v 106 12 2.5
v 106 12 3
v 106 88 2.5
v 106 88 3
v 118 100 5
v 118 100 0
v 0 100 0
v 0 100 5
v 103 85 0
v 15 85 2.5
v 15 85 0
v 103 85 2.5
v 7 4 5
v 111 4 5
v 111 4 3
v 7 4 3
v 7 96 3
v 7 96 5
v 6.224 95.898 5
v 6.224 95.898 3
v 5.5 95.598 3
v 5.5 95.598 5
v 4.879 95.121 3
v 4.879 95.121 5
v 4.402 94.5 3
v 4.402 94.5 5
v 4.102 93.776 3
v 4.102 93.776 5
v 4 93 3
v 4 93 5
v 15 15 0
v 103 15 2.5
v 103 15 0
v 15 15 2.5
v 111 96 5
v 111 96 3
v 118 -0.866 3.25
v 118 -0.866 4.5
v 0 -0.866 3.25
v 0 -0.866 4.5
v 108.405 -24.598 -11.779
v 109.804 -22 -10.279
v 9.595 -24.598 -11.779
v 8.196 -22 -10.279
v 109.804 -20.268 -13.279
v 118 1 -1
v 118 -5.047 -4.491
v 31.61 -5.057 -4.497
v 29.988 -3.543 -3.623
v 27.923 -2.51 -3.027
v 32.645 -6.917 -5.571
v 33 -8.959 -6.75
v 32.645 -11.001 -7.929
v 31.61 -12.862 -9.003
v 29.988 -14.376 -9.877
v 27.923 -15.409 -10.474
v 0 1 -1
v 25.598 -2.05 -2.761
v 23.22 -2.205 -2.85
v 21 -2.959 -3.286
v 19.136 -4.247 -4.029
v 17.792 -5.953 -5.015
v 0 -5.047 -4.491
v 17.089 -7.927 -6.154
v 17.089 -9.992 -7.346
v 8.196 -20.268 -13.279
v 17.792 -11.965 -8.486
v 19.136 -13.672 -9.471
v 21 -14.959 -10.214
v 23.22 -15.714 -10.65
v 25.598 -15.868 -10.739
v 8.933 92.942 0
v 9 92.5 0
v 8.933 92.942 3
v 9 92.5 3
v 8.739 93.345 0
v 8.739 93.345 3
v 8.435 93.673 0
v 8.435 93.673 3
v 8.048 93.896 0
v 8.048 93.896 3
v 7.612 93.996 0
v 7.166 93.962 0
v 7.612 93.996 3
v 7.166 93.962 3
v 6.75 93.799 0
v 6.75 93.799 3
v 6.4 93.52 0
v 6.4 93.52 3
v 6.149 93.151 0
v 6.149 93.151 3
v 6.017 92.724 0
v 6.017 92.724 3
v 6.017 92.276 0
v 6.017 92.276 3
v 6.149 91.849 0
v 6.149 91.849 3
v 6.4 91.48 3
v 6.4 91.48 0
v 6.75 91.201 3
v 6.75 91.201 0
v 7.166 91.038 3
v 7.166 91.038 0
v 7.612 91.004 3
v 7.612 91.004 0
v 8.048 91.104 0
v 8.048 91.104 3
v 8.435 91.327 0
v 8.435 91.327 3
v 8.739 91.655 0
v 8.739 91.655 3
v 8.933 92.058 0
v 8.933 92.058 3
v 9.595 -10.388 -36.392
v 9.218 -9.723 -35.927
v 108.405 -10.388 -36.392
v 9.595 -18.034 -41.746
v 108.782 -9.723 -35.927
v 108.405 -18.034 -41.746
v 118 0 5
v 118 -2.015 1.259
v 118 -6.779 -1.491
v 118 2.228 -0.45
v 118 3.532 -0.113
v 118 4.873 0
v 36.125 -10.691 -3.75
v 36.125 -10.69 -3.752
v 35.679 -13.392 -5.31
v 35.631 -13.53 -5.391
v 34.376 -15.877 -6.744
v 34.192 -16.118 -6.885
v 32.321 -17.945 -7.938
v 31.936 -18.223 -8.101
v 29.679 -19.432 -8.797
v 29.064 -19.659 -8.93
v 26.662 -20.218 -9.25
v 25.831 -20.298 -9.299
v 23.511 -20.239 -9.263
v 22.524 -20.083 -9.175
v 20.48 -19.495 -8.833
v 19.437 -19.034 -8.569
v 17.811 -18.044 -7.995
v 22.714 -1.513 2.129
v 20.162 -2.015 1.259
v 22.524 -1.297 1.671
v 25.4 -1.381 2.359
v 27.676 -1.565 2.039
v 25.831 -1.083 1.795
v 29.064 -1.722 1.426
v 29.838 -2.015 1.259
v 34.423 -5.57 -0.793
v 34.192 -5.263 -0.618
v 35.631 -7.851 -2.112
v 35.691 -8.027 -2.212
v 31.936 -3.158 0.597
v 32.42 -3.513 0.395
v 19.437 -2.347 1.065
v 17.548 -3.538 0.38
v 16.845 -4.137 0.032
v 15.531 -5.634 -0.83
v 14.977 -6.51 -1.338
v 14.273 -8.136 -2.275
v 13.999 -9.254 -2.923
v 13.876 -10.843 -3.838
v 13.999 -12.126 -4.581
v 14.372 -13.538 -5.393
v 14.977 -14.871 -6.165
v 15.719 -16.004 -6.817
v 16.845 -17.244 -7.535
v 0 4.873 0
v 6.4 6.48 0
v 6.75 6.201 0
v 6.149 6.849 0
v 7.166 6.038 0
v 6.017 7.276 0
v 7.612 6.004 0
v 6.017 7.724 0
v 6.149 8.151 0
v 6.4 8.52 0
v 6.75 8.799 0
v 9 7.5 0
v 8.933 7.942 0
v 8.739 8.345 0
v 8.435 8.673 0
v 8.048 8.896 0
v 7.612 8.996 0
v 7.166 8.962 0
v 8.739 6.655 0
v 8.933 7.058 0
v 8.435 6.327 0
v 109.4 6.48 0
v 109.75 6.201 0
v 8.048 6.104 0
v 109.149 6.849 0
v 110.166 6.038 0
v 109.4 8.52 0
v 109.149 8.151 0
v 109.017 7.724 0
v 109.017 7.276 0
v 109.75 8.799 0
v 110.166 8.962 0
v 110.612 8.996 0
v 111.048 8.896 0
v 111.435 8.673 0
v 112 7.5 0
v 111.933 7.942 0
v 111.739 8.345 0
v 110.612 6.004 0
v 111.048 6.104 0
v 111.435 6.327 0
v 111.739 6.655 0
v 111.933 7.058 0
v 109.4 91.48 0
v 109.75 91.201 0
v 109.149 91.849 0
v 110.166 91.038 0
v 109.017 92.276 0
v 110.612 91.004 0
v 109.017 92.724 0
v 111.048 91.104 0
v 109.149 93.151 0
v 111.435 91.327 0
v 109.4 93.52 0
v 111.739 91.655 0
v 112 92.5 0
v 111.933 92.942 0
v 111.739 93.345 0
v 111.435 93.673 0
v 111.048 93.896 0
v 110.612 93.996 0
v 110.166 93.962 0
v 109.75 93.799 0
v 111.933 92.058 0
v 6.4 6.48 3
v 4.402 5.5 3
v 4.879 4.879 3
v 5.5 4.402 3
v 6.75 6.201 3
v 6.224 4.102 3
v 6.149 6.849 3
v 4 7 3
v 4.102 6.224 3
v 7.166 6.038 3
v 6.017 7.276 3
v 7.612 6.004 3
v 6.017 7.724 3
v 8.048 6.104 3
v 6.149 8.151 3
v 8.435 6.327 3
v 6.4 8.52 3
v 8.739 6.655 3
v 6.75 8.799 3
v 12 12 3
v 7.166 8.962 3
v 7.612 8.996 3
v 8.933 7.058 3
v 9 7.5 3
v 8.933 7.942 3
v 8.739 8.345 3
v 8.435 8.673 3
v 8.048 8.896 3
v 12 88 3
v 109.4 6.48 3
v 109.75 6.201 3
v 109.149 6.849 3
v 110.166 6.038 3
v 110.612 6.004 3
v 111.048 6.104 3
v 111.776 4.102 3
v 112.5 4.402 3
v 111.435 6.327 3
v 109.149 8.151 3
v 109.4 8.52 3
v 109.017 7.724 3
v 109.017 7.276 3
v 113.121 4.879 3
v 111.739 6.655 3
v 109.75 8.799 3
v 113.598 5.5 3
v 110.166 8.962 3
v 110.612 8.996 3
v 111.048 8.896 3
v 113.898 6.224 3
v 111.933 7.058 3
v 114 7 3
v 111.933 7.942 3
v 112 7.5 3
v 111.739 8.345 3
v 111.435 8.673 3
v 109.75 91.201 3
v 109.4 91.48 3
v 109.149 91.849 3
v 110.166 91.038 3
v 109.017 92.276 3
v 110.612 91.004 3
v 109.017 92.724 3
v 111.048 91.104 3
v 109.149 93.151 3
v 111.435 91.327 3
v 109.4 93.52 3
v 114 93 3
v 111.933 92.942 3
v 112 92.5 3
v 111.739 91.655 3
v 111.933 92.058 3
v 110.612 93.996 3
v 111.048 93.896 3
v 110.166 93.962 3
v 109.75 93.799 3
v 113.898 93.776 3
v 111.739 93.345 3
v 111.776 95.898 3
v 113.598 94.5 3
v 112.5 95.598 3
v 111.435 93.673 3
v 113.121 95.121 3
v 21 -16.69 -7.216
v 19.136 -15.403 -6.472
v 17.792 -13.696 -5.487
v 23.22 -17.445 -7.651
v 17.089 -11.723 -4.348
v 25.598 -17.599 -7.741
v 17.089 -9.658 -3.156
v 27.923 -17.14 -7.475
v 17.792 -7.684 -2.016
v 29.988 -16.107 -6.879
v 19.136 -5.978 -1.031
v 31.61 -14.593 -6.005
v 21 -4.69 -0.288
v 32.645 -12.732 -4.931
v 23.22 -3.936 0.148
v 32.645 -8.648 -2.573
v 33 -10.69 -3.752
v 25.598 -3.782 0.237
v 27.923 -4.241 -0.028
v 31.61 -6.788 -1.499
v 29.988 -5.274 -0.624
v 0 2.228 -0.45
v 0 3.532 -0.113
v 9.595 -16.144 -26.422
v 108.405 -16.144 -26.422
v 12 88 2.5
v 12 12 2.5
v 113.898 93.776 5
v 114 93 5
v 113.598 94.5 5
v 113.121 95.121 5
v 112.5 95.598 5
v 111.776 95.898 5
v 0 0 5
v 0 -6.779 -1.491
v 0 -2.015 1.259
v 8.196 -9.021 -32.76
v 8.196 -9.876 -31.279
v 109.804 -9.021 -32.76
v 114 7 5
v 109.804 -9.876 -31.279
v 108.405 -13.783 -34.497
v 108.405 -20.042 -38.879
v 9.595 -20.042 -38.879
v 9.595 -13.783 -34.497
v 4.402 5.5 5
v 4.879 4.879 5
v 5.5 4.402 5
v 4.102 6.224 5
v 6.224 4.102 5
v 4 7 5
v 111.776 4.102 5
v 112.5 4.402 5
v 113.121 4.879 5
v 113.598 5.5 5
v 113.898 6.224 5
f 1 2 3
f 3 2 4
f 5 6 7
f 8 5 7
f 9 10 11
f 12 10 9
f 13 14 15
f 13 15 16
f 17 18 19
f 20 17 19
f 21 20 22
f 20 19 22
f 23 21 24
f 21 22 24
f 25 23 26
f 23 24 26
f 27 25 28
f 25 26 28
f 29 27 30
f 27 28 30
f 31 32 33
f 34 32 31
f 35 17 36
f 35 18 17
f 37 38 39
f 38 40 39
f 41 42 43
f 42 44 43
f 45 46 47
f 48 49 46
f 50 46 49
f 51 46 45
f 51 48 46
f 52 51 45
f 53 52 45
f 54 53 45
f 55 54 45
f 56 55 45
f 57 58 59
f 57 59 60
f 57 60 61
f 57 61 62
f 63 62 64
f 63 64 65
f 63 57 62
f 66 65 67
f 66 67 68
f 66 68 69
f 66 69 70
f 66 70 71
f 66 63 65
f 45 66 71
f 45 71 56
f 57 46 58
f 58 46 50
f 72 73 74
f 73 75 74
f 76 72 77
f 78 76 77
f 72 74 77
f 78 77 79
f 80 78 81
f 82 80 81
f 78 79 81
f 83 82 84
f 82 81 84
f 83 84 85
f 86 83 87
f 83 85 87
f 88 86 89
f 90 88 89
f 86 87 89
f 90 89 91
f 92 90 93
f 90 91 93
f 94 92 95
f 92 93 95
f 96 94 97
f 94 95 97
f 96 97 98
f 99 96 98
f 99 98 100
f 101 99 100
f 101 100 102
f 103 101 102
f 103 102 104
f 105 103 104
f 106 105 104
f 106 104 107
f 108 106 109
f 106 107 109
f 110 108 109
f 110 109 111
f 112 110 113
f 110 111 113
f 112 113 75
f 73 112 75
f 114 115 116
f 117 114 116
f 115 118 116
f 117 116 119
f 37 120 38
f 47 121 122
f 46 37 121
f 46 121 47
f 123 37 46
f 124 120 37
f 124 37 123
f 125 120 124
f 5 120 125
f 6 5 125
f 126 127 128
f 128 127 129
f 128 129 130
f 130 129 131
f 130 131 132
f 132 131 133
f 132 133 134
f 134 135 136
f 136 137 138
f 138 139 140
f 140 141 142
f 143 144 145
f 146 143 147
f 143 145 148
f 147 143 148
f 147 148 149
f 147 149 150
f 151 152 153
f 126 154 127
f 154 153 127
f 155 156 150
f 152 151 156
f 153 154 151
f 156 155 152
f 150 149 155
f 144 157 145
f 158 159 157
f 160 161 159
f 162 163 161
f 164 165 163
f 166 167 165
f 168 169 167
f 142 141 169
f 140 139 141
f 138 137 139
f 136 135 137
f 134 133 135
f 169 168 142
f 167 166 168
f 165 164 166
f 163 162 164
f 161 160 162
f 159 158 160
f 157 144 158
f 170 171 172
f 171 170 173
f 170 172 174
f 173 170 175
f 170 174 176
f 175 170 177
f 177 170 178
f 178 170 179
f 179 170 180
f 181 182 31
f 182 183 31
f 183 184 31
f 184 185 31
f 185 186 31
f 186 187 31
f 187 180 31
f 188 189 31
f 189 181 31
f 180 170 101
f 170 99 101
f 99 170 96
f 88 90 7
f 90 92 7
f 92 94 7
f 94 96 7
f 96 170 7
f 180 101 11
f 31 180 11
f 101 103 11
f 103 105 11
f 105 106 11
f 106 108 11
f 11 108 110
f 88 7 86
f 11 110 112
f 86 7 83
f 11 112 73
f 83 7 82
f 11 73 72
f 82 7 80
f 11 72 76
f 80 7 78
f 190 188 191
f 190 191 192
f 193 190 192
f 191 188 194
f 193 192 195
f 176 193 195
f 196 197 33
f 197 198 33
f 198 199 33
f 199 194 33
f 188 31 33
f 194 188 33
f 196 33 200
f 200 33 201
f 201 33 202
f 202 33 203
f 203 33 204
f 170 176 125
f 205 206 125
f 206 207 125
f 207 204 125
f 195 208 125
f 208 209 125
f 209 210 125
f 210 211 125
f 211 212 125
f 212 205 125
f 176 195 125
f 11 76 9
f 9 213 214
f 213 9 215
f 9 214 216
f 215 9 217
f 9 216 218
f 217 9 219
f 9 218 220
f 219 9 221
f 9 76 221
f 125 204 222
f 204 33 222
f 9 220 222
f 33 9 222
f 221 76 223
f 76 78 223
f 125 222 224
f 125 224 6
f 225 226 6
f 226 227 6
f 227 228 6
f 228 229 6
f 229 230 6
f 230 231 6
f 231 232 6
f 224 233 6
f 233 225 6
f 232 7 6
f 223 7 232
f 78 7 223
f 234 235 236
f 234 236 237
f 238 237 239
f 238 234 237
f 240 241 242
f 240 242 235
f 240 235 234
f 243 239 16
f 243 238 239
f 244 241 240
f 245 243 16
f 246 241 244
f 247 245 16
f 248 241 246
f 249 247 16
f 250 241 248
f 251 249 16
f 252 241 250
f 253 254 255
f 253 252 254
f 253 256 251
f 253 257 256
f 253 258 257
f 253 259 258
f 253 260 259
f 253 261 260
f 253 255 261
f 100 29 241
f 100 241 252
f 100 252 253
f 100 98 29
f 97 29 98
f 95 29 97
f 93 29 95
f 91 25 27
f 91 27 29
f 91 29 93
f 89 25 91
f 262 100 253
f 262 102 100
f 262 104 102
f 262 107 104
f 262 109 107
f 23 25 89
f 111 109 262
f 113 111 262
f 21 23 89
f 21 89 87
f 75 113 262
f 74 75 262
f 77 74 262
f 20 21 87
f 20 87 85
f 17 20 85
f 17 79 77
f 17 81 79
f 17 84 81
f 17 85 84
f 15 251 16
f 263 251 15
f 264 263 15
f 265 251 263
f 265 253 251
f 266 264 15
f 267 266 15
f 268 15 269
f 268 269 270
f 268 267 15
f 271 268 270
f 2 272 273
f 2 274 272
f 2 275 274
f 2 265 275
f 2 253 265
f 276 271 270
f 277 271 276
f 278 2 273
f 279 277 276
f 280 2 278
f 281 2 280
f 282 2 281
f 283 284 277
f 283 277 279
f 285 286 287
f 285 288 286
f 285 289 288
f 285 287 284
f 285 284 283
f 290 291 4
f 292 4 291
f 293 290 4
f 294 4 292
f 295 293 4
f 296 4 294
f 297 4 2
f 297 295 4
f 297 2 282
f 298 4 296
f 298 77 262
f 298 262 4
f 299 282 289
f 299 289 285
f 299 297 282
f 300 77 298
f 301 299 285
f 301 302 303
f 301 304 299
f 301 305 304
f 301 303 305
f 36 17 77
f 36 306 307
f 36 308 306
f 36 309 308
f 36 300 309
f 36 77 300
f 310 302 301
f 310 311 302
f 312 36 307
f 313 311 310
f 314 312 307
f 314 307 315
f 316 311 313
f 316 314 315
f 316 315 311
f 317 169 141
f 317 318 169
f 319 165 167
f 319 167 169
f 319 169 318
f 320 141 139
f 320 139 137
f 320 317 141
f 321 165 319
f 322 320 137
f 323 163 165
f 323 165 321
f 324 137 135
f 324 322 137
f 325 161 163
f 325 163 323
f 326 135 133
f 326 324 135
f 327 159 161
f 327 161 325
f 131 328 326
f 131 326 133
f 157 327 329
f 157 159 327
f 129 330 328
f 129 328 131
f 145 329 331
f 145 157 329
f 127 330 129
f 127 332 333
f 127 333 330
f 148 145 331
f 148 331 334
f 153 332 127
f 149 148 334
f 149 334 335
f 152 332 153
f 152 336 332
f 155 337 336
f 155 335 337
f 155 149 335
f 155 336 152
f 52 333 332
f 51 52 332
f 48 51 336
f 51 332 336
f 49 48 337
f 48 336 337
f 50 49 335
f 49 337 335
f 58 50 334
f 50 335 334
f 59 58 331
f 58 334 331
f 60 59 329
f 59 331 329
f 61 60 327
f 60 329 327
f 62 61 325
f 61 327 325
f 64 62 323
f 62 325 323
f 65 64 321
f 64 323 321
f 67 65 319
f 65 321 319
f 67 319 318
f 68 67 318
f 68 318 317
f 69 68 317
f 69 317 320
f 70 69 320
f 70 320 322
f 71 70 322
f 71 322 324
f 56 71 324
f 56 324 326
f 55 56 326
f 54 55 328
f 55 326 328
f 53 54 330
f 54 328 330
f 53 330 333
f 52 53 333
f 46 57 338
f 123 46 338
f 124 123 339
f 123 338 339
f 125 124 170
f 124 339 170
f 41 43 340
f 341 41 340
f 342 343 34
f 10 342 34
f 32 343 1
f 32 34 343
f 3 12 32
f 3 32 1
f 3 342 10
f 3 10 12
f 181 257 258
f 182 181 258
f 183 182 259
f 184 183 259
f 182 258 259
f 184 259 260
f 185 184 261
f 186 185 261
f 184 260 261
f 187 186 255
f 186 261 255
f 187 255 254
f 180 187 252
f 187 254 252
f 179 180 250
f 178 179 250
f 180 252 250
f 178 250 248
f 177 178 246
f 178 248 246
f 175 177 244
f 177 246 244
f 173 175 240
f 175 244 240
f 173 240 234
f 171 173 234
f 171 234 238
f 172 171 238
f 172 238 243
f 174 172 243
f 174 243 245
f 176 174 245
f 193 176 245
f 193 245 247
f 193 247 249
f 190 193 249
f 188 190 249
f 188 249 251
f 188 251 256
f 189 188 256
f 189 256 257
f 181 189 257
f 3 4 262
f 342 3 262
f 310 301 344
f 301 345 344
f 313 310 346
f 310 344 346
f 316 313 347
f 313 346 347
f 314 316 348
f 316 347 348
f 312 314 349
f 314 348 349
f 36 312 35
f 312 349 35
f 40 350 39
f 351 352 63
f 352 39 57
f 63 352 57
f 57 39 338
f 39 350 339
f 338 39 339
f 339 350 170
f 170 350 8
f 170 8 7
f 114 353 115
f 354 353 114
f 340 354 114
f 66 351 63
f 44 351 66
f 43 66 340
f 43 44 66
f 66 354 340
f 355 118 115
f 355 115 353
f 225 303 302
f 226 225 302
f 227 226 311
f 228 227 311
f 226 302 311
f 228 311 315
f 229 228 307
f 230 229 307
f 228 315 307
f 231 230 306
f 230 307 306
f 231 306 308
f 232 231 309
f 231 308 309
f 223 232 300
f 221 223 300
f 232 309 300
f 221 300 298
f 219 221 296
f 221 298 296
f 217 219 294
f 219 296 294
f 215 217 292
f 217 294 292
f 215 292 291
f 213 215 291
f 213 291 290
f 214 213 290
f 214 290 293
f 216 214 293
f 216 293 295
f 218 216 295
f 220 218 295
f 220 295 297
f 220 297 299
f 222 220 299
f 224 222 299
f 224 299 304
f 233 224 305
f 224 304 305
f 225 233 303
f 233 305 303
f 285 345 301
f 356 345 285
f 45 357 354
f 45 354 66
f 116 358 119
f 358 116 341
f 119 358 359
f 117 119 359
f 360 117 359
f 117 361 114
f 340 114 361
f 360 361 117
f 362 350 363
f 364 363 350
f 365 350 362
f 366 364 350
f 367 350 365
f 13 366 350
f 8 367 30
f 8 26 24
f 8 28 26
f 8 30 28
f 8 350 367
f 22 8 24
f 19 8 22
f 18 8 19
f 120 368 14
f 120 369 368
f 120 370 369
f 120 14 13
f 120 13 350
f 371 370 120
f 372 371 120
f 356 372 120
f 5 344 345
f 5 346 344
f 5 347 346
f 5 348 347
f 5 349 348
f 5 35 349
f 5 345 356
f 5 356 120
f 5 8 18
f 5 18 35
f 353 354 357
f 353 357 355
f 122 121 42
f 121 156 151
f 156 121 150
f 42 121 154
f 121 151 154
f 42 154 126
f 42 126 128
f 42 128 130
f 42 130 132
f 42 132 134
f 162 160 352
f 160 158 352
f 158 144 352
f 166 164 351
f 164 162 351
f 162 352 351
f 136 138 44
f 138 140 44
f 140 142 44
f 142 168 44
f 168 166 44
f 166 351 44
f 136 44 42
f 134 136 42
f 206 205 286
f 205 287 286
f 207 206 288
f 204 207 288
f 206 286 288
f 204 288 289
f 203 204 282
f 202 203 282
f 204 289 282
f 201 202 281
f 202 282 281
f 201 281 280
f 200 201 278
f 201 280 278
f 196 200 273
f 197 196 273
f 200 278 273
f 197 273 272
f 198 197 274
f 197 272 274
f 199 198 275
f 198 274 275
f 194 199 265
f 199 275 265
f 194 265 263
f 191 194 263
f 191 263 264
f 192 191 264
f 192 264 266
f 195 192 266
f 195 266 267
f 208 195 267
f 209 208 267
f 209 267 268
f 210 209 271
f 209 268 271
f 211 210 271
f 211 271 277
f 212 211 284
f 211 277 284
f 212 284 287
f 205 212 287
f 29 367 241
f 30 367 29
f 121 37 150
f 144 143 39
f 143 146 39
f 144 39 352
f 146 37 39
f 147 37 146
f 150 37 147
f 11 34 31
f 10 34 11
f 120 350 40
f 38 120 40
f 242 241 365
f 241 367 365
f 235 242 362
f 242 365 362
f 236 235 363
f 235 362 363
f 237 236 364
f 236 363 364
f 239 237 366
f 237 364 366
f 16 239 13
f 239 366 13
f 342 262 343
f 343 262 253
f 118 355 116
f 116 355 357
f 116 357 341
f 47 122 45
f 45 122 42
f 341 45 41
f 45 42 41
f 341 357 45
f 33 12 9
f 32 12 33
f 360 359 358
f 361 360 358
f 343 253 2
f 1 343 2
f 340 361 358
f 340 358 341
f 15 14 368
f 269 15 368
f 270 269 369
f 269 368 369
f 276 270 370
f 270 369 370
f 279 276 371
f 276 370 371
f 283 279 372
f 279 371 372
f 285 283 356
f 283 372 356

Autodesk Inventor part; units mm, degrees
ref_plane "YZ Plane" through (0, 0, 0) normal (1, 0, 0) x (0, 1, 0)
ref_plane "XZ Plane" through (0, 0, 0) normal (0, 1, 0) x (-1, 0, 0)
ref_plane "XY Plane" through (0, 0, 0) normal (0, 0, 1) x (1, 0, 0)
sketch "Sketch1" plane through (0, 0, 0) normal (0, 0, 1) x (1, 0, 0)
  line L0 (0, 0) -> (118, 0)
  line L1 (118, 0) -> (118, 100)
  line L2 (118, 100) -> (0, 100)
  line L3 (0, 100) -> (0, 0)
  line L4 (-23.6, 0) -> (141.6, 0) projected
  line L5 (0, -20) -> (0, 120) projected
  dimension "d3" = 118
  dimension "d4" = 100
  dimension "d45" = 0
  dimension "d46" = 0
extrude "Extrusion1" add sketch "Sketch1" along normal blind 5
sketch "Sketch2" plane through (0, 0, 5) normal (0, 0, 1) x (1, 0, 0)
  line L0 (7, 96) -> (111, 96)
  line L1 (114, 93) -> (114, 7)
  line L2 (111, 4) -> (7, 4)
  line L3 (4, 7) -> (4, 93)
  line L4 (118, 100) -> (0, 100) projected
  line L5 (0, 100) -> (0, 0) projected
  line L6 (0, 0) -> (118, 0) projected
  arc A0 (7, 96) -> (4, 93) centre (7, 93) ccw
  arc A1 (114, 93) -> (111, 96) centre (111, 93) ccw
  arc A2 (111, 4) -> (114, 7) centre (111, 7) ccw
  arc A3 (4, 7) -> (7, 4) centre (7, 7) ccw
  point P0 (4, 96)
  point P1 (114, 4)
  point P2 (114, 96)
  dimension "d7" = 110
  dimension "d8" = 92
  dimension "d10" = 4
  dimension "d11" = 4
  dimension "d12" = 3
extrude "Extrusion2" cut sketch "Sketch2" against normal blind 2
sketch "Sketch3" plane through (0, 0, 3) normal (0, 0, 1) x (1, 0, 0)
  line L0 (12, 12) -> (106, 12)
  line L1 (106, 12) -> (106, 88)
  line L2 (106, 88) -> (12, 88)
  line L3 (12, 88) -> (12, 12)
  line L4 (7, 96) -> (111, 96) projected
  line L5 (111, 4) -> (7, 4) projected
  line L6 (4, 7) -> (4, 93) projected
  line L7 (114, 93) -> (114, 7) projected
  point P0 (0, 0)
  point P1 (114, 7)
  point P2 (11.024, 100)
  point P3 (121.024, 100)
  point P4 (120, 96)
  point P5 (120, 4)
  dimension "d19" = 8
  dimension "d20" = 8
  dimension "d21" = 8
  dimension "d22" = 8
extrude "Extrusion3" cut sketch "Sketch3" against normal blind 0.5
sketch "Sketch4" plane through (0, 0, 2.5) normal (0, 0, 1) x (1, 0, 0)
  line L0 (15, 85) -> (103, 85)
  line L1 (103, 85) -> (103, 15)
  line L2 (103, 15) -> (15, 15)
  line L3 (15, 15) -> (15, 85)
  line L4 (106, 12) -> (12, 12) projected
  line L5 (12, 12) -> (12, 88) projected
  point P0 (0, 0)
  dimension "d25" = 88
  dimension "d26" = 70
  dimension "d27" = 3
  dimension "d28" = 3
extrude "Extrusion4" cut sketch "Sketch4" against normal through all
sketch "Sketch5" plane through (0, 0, 3) normal (0, 0, 1) x (1, 0, 0)
  circle A0 centre (7.5, 7.5) radius 1.5
  circle A1 centre (110.5, 7.5) radius 1.5
  circle A2 centre (110.5, 92.5) radius 1.5
  circle A3 centre (7.5, 92.5) radius 1.5
  line L0 (7, 96) -> (111, 96) projected
  line L1 (4, 7) -> (4, 93) projected
  line L2 (111, 4) -> (7, 4) projected
  line L3 (114, 93) -> (114, 7) projected
  point P0 (0, 0)
  point P1 (114, 7)
  point P2 (11.024, 100)
  point P3 (121.024, 100)
  point P4 (120, 96)
  point P5 (120, 4)
  dimension "d31" = 3.5
  dimension "d32" = 3.5
  dimension "d33" = 3.5
  dimension "d34" = 3.5
  dimension "d35" = 3.5
  dimension "d36" = 3.5
  dimension "d37" = 3.5
  dimension "d38" = 3.5
  dimension "d39" = 3
  dimension "d40" = 3
  dimension "d41" = 3
  dimension "d42" = 3
extrude "Extrusion5" cut sketch "Sketch5" against normal blind 3.5
sketch "Sketch6" plane through (0, 0, 0) normal (-1, 0, 0) x (0, 0, 1)
  line L0 (-1, 1) -> (-13.2791, -20.2679)
  line L1 (5, 0) -> (5, 100) projected
  line L2 (1.259, -2.0155) -> (-10.2791, -22)
  line L3 (-13.2791, -20.2679) -> (-10.2791, -22)
  line L4 (-1, 1) -> (0, 1)
  line L5 (0, 0) -> (0, 100) projected
  line L6 (5, 0) -> (4.5, -0.866)
  line L7 (4.5, -0.866) -> (3.25, -0.866)
  line L8 (3.25, -0.866) -> (1.259, -2.0155)
  line L9 (0, 0) -> (5, 0) projected
  line L10 (5, 0) -> (0, 0)
  dimension "d47" = 30
  dimension "d48" = 30
  dimension "d49" = 90
  dimension "d50" = 22
  dimension "d51" = 120
  dimension "d52" = 1
  dimension "d53" = 1.25
  dimension "d54" = 150
  dimension "d55" = 0
  dimension "d57" = 90
  dimension "d58" = 1
  dimension "d59" = 3
  dimension "d60" = 1
  dimension "d67" = 30
  dimension "d68" = 120
  dimension "d69" = 150
extrude "Extrusion6" add sketch "Sketch6" against normal blind 118
sketch "Sketch7" plane through (0, -22, -10.2791) normal (0, -0.5, 0.8660254) x (1, 0, 0)
  line L0 (0, 26.6921) -> (118, 26.6921) projected
  circle A0 centre (25, 13.0581) radius 8
  line L1 (118, 25.0581) -> (0, 25.0581) projected
  line L2 (0, 0) -> (0, 23.0761) projected
  point P0 (0, 24.1921)
  dimension "d70" = 16
  dimension "d71" = 12
  dimension "d72" = 25
extrude "Extrusion7" cut sketch "Sketch7" against normal up to next
sketch "Sketch8" plane through (0, -22, -10.2791) normal (0, -0.5, 0.8660254) x (1, 0, 0)
  circle A0 centre (25, 13.0581) radius 8 projected
  circle A1 centre (25, 13.0581) radius 11.125
  point P0 (0, 24.1921)
  dimension "d75" = 22.25
extrude "Extrusion8" cut sketch "Sketch8" along normal blind 1
sketch "Sketch9" plane through (0, 100, 0) normal (-1, 0, 0) x (0, 0, 1)
  line L0 (-10.2791, -122) -> (1.259, -102.0155) projected
  line L1 (-10.2791, -122) -> (-11.7791, -124.5981)
  line L2 (-11.7791, -124.5981) -> (-32.7791, -112.4737)
  line L3 (-32.7791, -112.4737) -> (-31.2791, -109.8756)
  line L4 (-1, -99) -> (-13.2791, -120.2679) projected
  line L5 (-31.2791, -109.8756) -> (-13.2791, -120.2679)
  line L6 (-13.2791, -120.2679) -> (-10.2791, -122)
  point P0 (0, -100)
  dimension "d79" = 3
  dimension "d80" = 90
  dimension "d82" = 90
  dimension "d83" = 90
  dimension "d84" = 90
  dimension "d85" = 21
extrude "Extrusion9" add sketch "Sketch9" against normal blind 118
sketch "Sketch10" plane through (118, 100, 0) normal (1, 0, 0) x (0, 0, -1)
  line L0 (35.9184, -109.7111) -> (41.7463, -118.0342) projected
  line L1 (31.2791, -109.8756) -> (32.7791, -112.4737) projected
  line L2 (41.7463, -118.0342) -> (38.8793, -120.0417)
  line L3 (32.7791, -112.4737) -> (33.3495, -112.1444)
  line L4 (38.8793, -120.0417) -> (33.3495, -112.1444)
  line L5 (31.2791, -109.8756) -> (34.6648, -107.9209)
  line L6 (41.7463, -118.0342) -> (34.6648, -107.9209)
  line L7 (32.7791, -112.4737) -> (11.7791, -124.5981) projected
  point P0 (0, -100)
  dimension "d88" = 3.5
  dimension "d93" = 3.5
  dimension "d97" = 0
extrude "Extrusion10" add sketch "Sketch10" against normal blind 118
fillet "Fillet1" radius 8 1 edges at (59, 1, 0)
chamfer "Chamfer1" distance 2.2 angle 45 1 edges at (59, -7.9209, -34.6648)
chamfer "Chamfer2" distance 2 distance2 8 1 edges at (59, -12.1444, -33.3495) measured on face at (78.6667, -14.7768, -35.1927)
sketch "Sketch11" plane through (25, -10.6913, -3.75) normal (0, -0.5, 0.8660254) x (1, 0, 0)
  line L0 (-25, -16.0581) -> (-25, 10.0179) projected
  line L1 (-25, 10.0179) -> (-25, 4.5179)
  line L2 (-25, 4.5179) -> (-15.4052, -16.0581)
  line L3 (-25, -25.6623) -> (-25, -18.0505) projected
  line L4 (-25, 4.5179) -> (-25, -25.6623)
  line L5 (-25, -25.6623) -> (-15.4052, -25.6623)
  line L6 (-25, -16.0581) -> (93, -16.0581) projected
  line L7 (-15.4052, -16.0581) -> (-15.4052, -25.6623)
  line L8 (93, 10.0179) -> (93, 4.5179)
  line L9 (93, 4.5179) -> (83.4052, -16.0581)
  line L10 (83.4052, -16.0581) -> (83.4052, -25.6623)
  line L11 (93, -25.6623) -> (83.4052, -25.6623)
  line L12 (93, -25.6623) -> (93, 4.5179)
  line L13 (93, 10.0179) -> (93, -16.0581) projected
  point P0 (-25, 11.134)
  point P1 (-25, -18.0505)
  dimension "d101" = 5.5
  dimension "d102" = 25
  dimension "d105" = 5.5
  dimension "d106" = 0
  dimension "d107" = 35.6803
extrude "Extrusion11" cut sketch "Sketch11" against normal through all
equation "\"d39\" = d41"
equation "\"d40\" = d41"
equation "\"d42\" = d41"
properties part number "MainHousing_FrontMainShell"
